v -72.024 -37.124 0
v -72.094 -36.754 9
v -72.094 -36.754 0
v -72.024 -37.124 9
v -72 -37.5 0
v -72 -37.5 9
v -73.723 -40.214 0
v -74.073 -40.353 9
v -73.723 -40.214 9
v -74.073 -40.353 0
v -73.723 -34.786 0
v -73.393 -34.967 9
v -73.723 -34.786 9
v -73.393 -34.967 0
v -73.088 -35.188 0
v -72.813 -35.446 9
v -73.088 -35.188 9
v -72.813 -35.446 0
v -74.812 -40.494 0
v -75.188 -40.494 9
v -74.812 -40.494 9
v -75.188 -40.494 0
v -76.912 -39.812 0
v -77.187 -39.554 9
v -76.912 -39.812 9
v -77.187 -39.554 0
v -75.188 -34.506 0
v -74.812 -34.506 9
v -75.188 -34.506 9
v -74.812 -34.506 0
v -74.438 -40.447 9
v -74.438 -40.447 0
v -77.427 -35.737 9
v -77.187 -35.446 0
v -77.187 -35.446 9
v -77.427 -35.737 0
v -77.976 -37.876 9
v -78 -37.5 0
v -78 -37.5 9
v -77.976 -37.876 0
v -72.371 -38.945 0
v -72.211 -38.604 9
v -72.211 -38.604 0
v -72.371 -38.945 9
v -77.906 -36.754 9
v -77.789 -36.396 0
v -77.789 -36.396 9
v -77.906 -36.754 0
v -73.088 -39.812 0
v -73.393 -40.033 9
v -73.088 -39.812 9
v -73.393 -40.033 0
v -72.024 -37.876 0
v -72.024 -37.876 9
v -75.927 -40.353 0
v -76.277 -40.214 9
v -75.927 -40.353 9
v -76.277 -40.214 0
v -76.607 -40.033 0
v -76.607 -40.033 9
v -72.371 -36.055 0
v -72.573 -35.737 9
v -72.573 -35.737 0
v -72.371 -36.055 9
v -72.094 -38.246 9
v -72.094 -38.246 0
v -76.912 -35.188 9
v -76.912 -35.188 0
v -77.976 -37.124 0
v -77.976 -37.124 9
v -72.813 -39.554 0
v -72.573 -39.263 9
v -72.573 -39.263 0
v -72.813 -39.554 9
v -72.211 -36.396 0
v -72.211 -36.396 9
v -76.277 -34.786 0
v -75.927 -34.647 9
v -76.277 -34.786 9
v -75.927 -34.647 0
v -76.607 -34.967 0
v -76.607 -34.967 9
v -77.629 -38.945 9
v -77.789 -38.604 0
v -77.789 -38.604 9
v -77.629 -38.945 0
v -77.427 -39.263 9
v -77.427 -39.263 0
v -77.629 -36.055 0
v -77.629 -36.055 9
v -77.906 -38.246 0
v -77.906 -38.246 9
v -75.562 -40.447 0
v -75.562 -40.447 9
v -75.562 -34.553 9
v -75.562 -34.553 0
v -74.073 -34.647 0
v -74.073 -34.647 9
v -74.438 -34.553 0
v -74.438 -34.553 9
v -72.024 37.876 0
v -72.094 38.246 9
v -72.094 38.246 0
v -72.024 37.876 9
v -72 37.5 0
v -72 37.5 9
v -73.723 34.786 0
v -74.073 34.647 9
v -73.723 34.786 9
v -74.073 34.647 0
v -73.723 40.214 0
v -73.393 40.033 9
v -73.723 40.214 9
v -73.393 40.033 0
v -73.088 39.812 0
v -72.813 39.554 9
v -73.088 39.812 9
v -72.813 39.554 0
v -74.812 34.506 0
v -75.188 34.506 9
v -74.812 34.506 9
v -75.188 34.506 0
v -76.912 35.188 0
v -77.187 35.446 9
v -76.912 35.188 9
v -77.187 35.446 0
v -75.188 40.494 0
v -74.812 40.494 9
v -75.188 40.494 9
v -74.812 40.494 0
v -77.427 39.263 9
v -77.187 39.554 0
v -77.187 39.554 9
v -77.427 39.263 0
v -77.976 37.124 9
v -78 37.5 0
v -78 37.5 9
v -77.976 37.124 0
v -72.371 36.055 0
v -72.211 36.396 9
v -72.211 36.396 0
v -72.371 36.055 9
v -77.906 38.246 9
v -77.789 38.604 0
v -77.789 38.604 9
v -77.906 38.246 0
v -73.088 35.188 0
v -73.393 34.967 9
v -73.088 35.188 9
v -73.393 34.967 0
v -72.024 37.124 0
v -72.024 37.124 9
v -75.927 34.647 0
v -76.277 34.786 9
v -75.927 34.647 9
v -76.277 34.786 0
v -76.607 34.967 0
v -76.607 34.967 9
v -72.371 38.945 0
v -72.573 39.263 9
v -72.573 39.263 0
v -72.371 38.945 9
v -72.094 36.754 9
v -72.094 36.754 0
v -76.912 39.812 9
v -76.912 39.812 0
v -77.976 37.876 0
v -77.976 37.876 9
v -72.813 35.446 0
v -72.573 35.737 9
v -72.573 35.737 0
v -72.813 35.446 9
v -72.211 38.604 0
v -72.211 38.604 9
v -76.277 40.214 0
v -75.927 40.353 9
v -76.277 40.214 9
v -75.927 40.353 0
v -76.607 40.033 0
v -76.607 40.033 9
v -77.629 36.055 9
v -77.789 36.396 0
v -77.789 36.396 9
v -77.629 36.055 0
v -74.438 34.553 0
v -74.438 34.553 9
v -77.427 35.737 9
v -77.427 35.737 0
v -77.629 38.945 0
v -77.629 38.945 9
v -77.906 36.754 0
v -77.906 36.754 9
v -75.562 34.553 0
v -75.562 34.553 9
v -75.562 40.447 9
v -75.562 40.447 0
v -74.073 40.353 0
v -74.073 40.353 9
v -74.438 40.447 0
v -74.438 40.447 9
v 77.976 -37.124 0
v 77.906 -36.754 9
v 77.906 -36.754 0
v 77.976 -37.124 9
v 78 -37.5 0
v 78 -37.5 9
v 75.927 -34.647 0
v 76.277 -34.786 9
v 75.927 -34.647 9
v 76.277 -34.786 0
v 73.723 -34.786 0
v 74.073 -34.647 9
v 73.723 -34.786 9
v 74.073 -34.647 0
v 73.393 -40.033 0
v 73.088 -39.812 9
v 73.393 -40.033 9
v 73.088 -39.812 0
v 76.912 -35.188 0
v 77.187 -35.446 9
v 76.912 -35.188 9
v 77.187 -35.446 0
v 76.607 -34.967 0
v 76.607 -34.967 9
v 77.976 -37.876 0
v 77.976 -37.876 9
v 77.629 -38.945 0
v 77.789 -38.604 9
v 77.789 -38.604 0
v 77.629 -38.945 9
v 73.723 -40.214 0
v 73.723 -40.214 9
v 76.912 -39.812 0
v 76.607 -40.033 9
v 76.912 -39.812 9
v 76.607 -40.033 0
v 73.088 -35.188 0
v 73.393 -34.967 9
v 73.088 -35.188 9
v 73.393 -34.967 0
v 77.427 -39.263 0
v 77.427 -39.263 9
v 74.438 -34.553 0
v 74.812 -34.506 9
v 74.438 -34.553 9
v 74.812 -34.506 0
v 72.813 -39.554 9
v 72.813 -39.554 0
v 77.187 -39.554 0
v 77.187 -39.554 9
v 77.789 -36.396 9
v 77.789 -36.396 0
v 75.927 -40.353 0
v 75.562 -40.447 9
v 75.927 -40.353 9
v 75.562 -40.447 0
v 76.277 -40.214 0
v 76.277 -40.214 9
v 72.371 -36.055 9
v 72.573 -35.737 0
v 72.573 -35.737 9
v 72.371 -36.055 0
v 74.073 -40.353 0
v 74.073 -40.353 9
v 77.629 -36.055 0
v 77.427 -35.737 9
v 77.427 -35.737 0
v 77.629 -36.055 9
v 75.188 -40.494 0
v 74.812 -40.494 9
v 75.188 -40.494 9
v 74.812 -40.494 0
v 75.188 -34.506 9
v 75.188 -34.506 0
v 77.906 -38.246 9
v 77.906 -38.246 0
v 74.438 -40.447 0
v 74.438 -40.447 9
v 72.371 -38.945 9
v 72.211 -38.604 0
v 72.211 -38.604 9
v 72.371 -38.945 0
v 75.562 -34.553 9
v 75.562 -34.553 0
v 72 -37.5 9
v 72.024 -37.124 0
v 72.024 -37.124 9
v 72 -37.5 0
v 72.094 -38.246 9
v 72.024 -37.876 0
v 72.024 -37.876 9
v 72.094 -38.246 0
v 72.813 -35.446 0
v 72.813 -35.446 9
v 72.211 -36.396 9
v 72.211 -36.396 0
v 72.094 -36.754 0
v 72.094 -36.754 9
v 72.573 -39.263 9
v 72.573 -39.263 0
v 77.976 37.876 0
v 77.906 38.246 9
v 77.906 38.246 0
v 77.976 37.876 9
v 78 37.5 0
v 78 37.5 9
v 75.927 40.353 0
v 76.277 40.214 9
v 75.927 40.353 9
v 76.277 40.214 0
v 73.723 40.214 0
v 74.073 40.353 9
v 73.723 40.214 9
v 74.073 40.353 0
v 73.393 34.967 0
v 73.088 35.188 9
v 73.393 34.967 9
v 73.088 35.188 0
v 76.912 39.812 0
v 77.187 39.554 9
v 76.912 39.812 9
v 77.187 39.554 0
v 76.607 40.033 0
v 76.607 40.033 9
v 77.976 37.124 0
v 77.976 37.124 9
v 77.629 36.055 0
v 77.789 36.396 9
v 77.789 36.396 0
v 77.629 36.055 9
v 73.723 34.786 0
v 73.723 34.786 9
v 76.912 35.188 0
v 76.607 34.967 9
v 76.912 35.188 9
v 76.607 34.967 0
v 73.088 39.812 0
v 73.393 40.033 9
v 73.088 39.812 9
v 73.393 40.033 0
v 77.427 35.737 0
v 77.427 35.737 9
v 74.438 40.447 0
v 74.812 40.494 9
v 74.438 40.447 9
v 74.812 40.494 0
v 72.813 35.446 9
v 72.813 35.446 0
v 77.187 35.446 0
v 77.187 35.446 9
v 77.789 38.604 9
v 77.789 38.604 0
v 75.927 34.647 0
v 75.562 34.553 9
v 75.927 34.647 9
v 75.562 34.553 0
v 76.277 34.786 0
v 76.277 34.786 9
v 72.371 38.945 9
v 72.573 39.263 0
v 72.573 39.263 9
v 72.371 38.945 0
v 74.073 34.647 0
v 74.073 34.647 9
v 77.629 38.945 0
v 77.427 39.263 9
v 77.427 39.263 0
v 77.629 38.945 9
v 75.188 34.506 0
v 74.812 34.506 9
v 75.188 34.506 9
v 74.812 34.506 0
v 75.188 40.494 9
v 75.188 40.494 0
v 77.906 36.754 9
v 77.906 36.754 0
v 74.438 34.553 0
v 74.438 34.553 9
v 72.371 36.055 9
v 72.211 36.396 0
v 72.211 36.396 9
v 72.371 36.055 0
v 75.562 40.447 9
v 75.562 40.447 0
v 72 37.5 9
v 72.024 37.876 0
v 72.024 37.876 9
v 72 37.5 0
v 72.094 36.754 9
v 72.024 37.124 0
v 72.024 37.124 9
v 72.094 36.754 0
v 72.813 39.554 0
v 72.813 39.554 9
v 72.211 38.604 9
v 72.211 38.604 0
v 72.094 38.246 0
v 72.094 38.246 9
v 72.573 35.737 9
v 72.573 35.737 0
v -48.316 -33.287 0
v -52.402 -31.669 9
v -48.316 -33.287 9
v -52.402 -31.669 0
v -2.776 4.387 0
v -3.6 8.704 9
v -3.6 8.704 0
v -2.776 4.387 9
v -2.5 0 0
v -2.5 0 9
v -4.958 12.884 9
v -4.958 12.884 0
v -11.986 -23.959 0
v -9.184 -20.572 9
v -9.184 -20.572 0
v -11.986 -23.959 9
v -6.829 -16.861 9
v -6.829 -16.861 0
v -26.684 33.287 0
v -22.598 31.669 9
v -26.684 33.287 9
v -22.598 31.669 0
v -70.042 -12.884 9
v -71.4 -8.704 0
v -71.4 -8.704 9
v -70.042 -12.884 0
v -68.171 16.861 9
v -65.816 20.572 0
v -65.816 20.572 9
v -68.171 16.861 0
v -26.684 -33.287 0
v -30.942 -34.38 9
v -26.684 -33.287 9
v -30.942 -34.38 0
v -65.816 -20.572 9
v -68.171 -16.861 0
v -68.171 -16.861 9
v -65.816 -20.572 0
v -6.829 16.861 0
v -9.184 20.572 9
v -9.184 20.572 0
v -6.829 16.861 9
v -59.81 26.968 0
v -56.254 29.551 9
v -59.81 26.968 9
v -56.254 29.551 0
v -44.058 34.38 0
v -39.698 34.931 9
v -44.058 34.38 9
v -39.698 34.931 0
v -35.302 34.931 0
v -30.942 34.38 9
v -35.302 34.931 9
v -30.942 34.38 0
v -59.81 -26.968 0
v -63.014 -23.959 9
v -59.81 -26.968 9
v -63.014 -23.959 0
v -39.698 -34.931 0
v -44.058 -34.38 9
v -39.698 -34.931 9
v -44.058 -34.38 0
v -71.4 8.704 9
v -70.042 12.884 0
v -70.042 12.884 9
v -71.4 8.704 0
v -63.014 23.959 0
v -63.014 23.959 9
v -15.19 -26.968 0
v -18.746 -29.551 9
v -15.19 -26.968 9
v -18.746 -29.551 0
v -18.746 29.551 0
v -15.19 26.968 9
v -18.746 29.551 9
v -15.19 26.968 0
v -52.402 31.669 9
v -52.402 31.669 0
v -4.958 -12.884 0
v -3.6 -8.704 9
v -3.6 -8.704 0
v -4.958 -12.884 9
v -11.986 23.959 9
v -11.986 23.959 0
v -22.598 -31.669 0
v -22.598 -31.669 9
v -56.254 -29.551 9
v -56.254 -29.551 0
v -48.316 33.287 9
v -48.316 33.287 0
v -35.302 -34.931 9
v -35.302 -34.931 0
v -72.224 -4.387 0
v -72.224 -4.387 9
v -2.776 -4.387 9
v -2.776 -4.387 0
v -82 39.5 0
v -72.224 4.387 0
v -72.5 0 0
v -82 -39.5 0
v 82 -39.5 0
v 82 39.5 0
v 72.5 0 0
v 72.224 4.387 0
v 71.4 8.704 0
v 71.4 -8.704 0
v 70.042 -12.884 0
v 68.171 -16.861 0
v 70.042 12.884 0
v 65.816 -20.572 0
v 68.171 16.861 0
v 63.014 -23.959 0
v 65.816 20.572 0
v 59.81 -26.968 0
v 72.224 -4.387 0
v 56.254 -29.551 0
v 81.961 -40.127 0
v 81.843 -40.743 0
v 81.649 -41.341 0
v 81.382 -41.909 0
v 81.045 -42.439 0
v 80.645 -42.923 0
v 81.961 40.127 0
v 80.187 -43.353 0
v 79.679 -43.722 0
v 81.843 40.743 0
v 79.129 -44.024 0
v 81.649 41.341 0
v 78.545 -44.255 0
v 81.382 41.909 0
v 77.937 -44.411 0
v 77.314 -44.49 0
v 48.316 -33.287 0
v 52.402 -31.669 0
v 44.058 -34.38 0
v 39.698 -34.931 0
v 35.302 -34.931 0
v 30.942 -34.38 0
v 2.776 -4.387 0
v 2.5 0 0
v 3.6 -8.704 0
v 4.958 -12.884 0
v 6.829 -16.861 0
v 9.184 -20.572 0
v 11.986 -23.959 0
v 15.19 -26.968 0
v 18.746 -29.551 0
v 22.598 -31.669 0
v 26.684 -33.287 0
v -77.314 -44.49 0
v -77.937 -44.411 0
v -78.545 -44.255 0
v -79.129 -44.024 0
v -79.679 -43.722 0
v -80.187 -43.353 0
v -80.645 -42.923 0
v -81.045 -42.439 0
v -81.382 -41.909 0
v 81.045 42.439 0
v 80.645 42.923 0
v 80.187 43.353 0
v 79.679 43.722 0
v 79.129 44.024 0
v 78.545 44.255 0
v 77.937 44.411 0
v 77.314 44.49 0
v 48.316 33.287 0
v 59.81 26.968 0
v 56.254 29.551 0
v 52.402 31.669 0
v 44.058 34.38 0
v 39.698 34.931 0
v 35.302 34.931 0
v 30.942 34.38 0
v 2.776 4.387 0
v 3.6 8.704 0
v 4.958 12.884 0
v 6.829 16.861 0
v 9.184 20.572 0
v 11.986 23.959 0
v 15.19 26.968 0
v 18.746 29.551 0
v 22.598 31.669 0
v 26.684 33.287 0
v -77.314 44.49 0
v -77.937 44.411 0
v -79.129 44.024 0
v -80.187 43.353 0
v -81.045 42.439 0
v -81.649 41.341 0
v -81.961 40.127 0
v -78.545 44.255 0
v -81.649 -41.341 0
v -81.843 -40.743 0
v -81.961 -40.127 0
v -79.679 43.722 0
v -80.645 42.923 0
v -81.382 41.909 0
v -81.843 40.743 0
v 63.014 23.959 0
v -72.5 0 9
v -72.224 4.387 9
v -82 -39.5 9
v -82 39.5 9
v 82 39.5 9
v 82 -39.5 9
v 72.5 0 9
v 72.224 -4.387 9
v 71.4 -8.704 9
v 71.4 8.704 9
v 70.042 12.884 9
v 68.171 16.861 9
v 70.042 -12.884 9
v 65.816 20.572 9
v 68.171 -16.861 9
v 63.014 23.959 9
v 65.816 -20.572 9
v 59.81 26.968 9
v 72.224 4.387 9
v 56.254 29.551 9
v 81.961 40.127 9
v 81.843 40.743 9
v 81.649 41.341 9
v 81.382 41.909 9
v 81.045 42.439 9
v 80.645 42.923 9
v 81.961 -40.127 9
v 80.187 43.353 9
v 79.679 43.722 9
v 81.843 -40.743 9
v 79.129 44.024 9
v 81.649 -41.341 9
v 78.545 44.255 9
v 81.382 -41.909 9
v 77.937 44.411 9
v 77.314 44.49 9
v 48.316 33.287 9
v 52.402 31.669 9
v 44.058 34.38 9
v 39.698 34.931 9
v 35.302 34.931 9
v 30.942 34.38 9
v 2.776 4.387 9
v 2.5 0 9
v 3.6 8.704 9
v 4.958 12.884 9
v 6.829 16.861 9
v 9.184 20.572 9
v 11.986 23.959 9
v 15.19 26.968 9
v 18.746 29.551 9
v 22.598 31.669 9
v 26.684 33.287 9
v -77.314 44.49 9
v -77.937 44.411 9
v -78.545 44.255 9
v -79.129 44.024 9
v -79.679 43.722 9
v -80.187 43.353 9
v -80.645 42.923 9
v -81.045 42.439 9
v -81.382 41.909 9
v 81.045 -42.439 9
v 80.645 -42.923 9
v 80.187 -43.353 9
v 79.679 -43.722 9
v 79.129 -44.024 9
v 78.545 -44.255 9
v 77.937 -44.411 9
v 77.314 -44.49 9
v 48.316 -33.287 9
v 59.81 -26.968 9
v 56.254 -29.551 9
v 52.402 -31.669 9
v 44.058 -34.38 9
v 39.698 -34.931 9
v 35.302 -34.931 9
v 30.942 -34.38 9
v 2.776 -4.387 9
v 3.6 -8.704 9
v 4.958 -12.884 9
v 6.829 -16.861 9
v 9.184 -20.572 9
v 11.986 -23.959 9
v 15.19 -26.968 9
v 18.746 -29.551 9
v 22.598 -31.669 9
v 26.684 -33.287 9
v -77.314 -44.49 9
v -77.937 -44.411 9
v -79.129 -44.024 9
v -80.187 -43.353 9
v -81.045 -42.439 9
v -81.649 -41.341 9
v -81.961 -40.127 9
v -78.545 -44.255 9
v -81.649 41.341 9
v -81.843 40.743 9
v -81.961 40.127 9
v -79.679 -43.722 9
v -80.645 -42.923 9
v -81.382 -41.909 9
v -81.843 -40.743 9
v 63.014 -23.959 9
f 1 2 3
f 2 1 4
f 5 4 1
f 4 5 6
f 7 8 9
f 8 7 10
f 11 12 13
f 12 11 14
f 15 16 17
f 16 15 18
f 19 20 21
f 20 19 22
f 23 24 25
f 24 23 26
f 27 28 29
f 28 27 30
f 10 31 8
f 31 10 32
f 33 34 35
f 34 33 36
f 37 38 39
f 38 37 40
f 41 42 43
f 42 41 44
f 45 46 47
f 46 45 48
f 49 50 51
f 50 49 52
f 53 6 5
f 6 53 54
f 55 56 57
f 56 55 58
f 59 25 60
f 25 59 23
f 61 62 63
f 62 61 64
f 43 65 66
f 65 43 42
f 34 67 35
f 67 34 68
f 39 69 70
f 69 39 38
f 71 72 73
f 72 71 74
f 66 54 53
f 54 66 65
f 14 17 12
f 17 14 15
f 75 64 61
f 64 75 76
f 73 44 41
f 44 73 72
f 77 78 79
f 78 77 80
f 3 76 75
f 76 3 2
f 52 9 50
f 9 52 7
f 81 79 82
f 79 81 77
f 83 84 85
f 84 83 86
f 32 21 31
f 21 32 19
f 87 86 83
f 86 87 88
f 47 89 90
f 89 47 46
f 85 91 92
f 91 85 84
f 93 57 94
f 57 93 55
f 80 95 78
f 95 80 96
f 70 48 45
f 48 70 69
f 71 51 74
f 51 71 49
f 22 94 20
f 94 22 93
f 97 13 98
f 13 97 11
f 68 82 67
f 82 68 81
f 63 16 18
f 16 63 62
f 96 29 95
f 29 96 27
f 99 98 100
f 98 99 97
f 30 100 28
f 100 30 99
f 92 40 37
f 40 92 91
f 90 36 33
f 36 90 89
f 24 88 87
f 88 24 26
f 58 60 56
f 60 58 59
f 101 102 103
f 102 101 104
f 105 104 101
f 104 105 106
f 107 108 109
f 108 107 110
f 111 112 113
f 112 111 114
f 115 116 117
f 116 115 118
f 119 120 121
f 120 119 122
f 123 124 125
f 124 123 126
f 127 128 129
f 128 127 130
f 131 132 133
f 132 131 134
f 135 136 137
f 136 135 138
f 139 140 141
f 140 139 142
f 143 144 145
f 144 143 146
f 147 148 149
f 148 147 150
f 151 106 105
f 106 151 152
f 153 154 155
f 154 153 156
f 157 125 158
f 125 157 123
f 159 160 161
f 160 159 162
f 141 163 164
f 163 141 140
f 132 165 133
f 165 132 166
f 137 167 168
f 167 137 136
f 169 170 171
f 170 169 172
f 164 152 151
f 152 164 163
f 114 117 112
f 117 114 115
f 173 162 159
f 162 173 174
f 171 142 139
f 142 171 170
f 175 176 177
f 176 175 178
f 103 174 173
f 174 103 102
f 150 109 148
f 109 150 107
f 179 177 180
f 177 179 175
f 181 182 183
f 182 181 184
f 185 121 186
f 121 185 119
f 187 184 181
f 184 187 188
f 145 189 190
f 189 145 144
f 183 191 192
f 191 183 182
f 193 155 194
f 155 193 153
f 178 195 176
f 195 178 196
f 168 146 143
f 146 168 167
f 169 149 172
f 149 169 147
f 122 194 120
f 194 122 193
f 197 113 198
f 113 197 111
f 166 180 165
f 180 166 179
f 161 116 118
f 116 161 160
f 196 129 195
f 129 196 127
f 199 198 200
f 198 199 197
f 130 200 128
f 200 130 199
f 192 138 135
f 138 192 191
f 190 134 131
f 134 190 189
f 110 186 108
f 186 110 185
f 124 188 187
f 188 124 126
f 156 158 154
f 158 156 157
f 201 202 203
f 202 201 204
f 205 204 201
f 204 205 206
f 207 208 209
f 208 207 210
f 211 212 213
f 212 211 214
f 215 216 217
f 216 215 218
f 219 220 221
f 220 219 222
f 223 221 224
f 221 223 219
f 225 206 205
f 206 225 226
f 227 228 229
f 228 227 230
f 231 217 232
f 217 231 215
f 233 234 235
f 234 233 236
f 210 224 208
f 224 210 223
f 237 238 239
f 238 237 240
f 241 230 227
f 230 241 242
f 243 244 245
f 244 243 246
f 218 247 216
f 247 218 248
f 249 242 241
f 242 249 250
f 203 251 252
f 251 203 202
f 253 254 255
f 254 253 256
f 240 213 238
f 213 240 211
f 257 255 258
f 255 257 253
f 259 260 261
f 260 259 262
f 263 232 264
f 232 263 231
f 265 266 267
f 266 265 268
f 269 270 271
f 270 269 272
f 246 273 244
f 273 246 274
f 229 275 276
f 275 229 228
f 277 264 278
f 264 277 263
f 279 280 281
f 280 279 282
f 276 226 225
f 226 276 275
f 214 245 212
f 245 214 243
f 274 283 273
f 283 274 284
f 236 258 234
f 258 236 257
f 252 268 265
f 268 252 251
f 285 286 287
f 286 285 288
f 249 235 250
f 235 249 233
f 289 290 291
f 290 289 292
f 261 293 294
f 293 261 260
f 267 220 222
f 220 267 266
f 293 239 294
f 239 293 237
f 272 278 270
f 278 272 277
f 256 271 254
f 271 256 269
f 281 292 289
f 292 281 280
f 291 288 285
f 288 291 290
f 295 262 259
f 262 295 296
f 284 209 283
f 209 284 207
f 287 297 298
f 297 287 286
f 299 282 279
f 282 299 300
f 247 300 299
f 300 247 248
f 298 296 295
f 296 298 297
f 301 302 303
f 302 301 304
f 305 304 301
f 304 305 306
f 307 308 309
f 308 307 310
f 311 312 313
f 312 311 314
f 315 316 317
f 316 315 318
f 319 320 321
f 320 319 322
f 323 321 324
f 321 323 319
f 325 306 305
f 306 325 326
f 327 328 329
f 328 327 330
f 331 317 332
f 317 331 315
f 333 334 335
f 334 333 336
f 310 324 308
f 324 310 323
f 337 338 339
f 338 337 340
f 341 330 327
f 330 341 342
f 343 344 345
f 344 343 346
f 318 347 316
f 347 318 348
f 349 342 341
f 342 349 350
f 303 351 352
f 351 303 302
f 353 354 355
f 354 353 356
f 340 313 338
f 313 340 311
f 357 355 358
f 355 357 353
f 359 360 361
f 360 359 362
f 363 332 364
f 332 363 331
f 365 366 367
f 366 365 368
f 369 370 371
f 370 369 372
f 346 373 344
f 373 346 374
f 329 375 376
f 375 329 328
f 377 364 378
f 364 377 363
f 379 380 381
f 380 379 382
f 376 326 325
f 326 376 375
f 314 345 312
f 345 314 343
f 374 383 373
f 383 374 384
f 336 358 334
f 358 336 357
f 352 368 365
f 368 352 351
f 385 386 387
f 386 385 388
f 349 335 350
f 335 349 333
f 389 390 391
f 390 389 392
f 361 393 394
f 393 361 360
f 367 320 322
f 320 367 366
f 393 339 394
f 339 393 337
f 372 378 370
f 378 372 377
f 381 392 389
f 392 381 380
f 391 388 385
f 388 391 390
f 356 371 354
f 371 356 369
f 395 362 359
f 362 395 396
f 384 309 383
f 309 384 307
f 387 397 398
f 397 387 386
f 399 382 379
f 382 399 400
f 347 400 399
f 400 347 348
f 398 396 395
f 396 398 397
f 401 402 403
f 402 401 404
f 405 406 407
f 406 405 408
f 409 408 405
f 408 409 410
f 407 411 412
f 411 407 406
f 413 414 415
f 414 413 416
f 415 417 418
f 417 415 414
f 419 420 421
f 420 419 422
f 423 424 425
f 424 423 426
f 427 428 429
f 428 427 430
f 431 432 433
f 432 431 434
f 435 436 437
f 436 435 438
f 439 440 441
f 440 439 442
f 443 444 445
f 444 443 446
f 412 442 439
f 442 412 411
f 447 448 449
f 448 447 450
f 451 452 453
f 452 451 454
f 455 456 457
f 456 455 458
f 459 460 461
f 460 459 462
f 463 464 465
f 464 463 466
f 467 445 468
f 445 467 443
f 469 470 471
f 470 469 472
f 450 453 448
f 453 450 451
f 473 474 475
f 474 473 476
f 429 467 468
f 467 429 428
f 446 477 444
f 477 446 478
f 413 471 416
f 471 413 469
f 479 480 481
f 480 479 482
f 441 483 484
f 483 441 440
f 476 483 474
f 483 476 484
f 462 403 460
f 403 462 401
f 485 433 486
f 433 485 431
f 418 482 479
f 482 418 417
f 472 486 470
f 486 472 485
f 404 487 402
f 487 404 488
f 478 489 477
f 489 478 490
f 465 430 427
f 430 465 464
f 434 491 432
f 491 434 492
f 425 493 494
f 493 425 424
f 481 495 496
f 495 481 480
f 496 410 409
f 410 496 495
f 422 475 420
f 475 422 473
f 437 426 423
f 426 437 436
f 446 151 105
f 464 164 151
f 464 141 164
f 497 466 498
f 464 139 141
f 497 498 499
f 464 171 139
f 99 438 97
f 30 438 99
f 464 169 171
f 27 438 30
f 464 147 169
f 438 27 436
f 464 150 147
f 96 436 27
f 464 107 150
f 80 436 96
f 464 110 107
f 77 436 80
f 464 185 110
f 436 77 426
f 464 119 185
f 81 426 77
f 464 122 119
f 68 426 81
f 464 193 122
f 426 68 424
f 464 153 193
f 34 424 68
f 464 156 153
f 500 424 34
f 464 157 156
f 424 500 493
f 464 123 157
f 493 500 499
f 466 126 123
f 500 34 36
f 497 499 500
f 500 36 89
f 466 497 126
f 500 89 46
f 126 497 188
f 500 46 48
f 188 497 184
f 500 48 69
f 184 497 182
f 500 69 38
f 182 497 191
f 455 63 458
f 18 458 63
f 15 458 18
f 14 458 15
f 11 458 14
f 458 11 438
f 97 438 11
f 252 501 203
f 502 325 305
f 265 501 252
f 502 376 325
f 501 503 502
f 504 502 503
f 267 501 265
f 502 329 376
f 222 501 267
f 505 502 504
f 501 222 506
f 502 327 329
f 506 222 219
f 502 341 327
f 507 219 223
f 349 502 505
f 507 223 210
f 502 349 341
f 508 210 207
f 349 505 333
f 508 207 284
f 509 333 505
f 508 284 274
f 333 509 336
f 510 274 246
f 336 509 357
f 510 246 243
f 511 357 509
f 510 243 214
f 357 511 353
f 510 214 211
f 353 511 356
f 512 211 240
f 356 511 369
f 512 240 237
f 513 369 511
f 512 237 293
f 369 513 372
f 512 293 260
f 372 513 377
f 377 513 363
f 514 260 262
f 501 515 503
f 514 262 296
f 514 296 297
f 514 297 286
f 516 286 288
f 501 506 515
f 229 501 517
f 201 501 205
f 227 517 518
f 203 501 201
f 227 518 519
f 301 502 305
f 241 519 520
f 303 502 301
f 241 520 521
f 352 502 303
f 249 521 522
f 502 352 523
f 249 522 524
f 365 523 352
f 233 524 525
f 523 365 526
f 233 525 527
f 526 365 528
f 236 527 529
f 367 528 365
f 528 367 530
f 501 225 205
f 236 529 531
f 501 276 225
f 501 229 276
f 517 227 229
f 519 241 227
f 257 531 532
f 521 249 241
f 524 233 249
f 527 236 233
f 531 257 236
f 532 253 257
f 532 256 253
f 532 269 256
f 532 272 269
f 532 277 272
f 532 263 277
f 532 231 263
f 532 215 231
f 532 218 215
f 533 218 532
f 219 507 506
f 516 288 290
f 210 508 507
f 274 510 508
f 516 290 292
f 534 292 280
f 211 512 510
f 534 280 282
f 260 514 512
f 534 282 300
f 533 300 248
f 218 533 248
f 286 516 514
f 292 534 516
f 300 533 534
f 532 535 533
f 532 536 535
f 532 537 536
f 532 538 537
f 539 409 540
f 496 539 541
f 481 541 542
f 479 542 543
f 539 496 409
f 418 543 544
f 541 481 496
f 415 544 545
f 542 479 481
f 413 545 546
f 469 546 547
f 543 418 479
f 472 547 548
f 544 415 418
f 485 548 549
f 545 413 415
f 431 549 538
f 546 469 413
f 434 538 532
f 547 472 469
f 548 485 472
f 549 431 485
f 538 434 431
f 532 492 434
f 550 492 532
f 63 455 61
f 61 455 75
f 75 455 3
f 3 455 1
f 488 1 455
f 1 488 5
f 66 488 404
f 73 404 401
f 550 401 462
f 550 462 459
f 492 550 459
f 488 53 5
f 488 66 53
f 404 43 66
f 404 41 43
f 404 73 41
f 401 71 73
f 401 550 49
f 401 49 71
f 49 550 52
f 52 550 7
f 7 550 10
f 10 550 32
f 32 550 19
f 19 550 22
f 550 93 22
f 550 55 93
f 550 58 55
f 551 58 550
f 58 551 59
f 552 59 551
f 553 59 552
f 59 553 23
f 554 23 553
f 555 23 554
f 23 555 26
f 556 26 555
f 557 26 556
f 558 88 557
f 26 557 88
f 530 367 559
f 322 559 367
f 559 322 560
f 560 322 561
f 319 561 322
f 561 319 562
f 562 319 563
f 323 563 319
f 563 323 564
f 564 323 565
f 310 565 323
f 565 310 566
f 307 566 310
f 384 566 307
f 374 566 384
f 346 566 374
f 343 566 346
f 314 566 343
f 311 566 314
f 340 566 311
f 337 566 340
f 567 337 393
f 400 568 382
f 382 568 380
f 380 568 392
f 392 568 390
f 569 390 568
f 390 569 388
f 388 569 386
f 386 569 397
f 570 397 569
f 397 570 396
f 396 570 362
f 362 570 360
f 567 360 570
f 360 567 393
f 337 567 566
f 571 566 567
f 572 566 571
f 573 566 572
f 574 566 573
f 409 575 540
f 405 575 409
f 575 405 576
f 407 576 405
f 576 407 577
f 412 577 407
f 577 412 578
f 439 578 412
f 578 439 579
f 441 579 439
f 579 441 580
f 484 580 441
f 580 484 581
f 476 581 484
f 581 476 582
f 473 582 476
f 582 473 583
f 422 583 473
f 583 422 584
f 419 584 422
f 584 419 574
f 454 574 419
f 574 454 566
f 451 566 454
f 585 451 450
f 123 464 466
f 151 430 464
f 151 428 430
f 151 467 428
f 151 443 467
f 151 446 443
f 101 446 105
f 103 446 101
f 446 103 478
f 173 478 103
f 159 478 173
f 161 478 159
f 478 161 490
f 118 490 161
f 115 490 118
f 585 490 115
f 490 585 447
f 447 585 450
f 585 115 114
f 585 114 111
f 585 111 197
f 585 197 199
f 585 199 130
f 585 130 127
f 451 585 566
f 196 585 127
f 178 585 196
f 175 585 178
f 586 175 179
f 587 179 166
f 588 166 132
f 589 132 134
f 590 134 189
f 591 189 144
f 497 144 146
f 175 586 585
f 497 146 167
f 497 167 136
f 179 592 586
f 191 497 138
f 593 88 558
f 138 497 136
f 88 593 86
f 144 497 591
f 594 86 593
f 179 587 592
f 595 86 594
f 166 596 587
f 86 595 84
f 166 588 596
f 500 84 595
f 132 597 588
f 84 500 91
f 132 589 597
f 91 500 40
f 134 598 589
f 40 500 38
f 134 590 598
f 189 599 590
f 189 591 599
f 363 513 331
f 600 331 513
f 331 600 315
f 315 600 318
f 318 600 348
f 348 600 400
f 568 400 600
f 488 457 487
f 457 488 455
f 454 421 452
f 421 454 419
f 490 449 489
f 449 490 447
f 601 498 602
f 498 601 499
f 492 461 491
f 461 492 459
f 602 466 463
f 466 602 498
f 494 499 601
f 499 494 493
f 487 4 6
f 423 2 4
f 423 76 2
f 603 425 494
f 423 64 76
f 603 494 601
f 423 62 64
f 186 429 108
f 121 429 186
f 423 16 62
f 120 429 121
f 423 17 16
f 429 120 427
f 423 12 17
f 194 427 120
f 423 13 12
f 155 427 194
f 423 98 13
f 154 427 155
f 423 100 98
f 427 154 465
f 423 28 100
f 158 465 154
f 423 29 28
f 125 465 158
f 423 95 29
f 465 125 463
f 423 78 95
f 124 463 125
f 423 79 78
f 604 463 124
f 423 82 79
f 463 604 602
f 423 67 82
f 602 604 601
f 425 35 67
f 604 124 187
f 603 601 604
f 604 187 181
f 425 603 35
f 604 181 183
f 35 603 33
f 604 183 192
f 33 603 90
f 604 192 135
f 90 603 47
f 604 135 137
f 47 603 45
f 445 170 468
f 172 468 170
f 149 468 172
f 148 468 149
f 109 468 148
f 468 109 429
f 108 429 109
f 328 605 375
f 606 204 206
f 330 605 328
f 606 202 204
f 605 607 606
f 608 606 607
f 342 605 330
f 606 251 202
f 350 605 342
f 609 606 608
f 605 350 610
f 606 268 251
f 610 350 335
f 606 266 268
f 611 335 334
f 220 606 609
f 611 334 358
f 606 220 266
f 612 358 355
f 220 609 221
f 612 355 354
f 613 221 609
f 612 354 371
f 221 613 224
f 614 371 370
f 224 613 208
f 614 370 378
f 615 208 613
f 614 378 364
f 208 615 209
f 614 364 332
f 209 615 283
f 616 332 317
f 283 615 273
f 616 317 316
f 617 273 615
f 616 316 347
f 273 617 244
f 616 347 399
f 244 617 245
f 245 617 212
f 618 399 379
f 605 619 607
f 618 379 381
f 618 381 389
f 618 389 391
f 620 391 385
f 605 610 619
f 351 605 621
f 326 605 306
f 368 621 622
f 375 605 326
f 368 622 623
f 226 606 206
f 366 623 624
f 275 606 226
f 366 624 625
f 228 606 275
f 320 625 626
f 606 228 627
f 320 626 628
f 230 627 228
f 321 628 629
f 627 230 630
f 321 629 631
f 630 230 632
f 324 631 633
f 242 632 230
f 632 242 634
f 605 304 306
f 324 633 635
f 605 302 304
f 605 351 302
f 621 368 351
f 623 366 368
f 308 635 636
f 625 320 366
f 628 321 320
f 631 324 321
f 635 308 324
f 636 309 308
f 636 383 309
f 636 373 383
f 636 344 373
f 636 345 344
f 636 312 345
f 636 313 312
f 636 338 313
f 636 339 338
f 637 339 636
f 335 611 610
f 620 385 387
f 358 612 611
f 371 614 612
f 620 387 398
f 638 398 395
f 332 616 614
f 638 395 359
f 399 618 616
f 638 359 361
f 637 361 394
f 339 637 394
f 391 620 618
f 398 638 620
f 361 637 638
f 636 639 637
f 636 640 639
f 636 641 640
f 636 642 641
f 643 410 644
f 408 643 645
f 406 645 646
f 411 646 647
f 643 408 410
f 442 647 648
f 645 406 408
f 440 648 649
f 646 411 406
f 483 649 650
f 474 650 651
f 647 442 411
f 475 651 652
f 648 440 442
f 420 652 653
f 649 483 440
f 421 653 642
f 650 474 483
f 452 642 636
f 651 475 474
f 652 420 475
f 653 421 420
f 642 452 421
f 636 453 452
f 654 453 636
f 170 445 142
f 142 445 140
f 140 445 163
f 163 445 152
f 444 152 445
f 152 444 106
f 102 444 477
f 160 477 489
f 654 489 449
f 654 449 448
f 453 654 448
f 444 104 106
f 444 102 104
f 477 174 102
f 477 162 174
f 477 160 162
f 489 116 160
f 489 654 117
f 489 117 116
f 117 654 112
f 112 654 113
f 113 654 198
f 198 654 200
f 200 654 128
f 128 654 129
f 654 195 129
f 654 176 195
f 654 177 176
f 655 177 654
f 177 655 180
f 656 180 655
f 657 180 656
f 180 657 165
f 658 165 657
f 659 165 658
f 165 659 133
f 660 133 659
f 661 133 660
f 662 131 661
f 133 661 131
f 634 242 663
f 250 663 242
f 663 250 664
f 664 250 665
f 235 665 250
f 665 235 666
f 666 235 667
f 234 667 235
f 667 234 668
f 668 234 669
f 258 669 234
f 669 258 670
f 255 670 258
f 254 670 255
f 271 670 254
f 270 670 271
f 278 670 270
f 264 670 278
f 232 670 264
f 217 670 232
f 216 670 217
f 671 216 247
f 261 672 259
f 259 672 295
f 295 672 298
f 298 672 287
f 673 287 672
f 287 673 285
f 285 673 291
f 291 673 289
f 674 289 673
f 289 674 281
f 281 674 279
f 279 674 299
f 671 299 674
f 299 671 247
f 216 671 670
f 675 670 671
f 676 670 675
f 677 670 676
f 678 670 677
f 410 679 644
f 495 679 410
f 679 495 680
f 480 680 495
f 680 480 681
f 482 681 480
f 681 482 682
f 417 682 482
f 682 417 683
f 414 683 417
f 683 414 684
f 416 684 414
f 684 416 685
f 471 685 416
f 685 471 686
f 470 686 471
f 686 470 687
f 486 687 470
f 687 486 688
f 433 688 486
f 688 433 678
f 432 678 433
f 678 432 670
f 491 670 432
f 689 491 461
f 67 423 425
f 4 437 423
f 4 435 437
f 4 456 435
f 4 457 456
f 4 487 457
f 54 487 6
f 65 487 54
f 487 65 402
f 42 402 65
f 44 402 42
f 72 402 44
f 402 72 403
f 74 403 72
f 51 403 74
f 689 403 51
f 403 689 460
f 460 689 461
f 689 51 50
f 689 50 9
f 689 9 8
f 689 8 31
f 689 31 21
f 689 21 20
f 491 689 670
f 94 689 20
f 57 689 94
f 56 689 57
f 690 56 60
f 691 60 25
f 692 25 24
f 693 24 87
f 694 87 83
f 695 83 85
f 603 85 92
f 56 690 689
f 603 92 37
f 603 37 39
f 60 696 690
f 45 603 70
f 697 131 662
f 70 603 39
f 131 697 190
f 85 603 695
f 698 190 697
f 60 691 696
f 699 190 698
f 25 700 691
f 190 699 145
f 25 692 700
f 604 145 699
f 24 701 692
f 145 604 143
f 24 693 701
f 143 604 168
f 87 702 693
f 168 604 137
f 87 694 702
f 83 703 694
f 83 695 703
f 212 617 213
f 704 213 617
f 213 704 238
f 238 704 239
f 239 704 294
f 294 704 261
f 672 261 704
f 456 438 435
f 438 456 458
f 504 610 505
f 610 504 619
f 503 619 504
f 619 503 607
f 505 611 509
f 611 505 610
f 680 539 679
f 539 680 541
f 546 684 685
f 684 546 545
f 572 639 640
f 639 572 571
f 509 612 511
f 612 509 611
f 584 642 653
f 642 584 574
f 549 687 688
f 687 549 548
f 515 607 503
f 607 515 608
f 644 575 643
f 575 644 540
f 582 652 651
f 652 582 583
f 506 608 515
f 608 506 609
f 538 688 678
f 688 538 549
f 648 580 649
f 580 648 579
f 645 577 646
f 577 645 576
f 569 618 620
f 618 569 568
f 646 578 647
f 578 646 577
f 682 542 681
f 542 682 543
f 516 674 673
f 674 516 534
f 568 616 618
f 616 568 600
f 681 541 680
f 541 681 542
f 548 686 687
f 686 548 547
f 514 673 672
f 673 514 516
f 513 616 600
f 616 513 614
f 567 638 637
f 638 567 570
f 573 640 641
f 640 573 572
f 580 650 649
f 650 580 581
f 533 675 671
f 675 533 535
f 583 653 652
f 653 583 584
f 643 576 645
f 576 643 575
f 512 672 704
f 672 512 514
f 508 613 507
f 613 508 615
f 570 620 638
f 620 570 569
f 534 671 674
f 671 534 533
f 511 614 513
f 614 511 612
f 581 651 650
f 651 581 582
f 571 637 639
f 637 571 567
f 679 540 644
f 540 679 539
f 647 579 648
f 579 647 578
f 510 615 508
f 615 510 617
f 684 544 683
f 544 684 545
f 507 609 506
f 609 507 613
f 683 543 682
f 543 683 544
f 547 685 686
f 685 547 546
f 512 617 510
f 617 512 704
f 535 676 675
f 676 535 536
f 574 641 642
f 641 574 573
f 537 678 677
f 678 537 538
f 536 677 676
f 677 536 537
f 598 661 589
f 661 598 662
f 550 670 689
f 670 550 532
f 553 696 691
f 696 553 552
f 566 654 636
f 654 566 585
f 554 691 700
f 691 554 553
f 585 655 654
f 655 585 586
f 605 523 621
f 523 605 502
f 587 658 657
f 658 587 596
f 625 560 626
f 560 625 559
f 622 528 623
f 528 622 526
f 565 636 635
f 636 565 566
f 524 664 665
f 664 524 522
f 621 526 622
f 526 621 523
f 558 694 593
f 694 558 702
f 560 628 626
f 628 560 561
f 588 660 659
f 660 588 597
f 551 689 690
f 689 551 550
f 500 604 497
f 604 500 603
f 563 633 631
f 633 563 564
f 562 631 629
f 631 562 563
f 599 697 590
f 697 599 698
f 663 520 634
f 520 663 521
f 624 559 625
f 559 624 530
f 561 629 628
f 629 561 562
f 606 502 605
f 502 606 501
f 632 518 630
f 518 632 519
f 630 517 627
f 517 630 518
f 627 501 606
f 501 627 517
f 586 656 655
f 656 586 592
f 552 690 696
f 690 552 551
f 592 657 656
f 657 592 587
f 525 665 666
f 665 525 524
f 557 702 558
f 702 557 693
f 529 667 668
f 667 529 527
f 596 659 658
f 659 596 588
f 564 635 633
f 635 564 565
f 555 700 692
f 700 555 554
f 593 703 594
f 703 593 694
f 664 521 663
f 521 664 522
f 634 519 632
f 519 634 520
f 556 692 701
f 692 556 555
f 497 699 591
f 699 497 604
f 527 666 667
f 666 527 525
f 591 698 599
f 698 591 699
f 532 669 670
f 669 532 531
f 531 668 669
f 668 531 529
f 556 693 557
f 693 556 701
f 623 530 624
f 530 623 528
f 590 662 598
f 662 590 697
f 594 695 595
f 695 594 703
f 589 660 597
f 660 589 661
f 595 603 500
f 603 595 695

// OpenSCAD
$fn = 50;


difference() {
	union() {
		hull() {
			translate(v = [-77.0000000000, 39.5000000000, 0]) {
				cylinder(h = 9, r = 5);
			}
			translate(v = [77.0000000000, 39.5000000000, 0]) {
				cylinder(h = 9, r = 5);
			}
			translate(v = [-77.0000000000, -39.5000000000, 0]) {
				cylinder(h = 9, r = 5);
			}
			translate(v = [77.0000000000, -39.5000000000, 0]) {
				cylinder(h = 9, r = 5);
			}
		}
	}
	union() {
		#translate(v = [-75.0000000000, -37.5000000000, -100.0000000000]) {
			cylinder(h = 200, r = 3.0000000000);
		}
		#translate(v = [-75.0000000000, 37.5000000000, -100.0000000000]) {
			cylinder(h = 200, r = 3.0000000000);
		}
		#translate(v = [75.0000000000, -37.5000000000, -100.0000000000]) {
			cylinder(h = 200, r = 3.0000000000);
		}
		#translate(v = [75.0000000000, 37.5000000000, -100.0000000000]) {
			cylinder(h = 200, r = 3.0000000000);
		}
		#translate(v = [-37.5000000000, 0, 0]) {
			cylinder(h = 9, r = 35.0000000000);
		}
		#translate(v = [37.5000000000, 0, 0]) {
			cylinder(h = 9, r = 35.0000000000);
		}
	}
}
